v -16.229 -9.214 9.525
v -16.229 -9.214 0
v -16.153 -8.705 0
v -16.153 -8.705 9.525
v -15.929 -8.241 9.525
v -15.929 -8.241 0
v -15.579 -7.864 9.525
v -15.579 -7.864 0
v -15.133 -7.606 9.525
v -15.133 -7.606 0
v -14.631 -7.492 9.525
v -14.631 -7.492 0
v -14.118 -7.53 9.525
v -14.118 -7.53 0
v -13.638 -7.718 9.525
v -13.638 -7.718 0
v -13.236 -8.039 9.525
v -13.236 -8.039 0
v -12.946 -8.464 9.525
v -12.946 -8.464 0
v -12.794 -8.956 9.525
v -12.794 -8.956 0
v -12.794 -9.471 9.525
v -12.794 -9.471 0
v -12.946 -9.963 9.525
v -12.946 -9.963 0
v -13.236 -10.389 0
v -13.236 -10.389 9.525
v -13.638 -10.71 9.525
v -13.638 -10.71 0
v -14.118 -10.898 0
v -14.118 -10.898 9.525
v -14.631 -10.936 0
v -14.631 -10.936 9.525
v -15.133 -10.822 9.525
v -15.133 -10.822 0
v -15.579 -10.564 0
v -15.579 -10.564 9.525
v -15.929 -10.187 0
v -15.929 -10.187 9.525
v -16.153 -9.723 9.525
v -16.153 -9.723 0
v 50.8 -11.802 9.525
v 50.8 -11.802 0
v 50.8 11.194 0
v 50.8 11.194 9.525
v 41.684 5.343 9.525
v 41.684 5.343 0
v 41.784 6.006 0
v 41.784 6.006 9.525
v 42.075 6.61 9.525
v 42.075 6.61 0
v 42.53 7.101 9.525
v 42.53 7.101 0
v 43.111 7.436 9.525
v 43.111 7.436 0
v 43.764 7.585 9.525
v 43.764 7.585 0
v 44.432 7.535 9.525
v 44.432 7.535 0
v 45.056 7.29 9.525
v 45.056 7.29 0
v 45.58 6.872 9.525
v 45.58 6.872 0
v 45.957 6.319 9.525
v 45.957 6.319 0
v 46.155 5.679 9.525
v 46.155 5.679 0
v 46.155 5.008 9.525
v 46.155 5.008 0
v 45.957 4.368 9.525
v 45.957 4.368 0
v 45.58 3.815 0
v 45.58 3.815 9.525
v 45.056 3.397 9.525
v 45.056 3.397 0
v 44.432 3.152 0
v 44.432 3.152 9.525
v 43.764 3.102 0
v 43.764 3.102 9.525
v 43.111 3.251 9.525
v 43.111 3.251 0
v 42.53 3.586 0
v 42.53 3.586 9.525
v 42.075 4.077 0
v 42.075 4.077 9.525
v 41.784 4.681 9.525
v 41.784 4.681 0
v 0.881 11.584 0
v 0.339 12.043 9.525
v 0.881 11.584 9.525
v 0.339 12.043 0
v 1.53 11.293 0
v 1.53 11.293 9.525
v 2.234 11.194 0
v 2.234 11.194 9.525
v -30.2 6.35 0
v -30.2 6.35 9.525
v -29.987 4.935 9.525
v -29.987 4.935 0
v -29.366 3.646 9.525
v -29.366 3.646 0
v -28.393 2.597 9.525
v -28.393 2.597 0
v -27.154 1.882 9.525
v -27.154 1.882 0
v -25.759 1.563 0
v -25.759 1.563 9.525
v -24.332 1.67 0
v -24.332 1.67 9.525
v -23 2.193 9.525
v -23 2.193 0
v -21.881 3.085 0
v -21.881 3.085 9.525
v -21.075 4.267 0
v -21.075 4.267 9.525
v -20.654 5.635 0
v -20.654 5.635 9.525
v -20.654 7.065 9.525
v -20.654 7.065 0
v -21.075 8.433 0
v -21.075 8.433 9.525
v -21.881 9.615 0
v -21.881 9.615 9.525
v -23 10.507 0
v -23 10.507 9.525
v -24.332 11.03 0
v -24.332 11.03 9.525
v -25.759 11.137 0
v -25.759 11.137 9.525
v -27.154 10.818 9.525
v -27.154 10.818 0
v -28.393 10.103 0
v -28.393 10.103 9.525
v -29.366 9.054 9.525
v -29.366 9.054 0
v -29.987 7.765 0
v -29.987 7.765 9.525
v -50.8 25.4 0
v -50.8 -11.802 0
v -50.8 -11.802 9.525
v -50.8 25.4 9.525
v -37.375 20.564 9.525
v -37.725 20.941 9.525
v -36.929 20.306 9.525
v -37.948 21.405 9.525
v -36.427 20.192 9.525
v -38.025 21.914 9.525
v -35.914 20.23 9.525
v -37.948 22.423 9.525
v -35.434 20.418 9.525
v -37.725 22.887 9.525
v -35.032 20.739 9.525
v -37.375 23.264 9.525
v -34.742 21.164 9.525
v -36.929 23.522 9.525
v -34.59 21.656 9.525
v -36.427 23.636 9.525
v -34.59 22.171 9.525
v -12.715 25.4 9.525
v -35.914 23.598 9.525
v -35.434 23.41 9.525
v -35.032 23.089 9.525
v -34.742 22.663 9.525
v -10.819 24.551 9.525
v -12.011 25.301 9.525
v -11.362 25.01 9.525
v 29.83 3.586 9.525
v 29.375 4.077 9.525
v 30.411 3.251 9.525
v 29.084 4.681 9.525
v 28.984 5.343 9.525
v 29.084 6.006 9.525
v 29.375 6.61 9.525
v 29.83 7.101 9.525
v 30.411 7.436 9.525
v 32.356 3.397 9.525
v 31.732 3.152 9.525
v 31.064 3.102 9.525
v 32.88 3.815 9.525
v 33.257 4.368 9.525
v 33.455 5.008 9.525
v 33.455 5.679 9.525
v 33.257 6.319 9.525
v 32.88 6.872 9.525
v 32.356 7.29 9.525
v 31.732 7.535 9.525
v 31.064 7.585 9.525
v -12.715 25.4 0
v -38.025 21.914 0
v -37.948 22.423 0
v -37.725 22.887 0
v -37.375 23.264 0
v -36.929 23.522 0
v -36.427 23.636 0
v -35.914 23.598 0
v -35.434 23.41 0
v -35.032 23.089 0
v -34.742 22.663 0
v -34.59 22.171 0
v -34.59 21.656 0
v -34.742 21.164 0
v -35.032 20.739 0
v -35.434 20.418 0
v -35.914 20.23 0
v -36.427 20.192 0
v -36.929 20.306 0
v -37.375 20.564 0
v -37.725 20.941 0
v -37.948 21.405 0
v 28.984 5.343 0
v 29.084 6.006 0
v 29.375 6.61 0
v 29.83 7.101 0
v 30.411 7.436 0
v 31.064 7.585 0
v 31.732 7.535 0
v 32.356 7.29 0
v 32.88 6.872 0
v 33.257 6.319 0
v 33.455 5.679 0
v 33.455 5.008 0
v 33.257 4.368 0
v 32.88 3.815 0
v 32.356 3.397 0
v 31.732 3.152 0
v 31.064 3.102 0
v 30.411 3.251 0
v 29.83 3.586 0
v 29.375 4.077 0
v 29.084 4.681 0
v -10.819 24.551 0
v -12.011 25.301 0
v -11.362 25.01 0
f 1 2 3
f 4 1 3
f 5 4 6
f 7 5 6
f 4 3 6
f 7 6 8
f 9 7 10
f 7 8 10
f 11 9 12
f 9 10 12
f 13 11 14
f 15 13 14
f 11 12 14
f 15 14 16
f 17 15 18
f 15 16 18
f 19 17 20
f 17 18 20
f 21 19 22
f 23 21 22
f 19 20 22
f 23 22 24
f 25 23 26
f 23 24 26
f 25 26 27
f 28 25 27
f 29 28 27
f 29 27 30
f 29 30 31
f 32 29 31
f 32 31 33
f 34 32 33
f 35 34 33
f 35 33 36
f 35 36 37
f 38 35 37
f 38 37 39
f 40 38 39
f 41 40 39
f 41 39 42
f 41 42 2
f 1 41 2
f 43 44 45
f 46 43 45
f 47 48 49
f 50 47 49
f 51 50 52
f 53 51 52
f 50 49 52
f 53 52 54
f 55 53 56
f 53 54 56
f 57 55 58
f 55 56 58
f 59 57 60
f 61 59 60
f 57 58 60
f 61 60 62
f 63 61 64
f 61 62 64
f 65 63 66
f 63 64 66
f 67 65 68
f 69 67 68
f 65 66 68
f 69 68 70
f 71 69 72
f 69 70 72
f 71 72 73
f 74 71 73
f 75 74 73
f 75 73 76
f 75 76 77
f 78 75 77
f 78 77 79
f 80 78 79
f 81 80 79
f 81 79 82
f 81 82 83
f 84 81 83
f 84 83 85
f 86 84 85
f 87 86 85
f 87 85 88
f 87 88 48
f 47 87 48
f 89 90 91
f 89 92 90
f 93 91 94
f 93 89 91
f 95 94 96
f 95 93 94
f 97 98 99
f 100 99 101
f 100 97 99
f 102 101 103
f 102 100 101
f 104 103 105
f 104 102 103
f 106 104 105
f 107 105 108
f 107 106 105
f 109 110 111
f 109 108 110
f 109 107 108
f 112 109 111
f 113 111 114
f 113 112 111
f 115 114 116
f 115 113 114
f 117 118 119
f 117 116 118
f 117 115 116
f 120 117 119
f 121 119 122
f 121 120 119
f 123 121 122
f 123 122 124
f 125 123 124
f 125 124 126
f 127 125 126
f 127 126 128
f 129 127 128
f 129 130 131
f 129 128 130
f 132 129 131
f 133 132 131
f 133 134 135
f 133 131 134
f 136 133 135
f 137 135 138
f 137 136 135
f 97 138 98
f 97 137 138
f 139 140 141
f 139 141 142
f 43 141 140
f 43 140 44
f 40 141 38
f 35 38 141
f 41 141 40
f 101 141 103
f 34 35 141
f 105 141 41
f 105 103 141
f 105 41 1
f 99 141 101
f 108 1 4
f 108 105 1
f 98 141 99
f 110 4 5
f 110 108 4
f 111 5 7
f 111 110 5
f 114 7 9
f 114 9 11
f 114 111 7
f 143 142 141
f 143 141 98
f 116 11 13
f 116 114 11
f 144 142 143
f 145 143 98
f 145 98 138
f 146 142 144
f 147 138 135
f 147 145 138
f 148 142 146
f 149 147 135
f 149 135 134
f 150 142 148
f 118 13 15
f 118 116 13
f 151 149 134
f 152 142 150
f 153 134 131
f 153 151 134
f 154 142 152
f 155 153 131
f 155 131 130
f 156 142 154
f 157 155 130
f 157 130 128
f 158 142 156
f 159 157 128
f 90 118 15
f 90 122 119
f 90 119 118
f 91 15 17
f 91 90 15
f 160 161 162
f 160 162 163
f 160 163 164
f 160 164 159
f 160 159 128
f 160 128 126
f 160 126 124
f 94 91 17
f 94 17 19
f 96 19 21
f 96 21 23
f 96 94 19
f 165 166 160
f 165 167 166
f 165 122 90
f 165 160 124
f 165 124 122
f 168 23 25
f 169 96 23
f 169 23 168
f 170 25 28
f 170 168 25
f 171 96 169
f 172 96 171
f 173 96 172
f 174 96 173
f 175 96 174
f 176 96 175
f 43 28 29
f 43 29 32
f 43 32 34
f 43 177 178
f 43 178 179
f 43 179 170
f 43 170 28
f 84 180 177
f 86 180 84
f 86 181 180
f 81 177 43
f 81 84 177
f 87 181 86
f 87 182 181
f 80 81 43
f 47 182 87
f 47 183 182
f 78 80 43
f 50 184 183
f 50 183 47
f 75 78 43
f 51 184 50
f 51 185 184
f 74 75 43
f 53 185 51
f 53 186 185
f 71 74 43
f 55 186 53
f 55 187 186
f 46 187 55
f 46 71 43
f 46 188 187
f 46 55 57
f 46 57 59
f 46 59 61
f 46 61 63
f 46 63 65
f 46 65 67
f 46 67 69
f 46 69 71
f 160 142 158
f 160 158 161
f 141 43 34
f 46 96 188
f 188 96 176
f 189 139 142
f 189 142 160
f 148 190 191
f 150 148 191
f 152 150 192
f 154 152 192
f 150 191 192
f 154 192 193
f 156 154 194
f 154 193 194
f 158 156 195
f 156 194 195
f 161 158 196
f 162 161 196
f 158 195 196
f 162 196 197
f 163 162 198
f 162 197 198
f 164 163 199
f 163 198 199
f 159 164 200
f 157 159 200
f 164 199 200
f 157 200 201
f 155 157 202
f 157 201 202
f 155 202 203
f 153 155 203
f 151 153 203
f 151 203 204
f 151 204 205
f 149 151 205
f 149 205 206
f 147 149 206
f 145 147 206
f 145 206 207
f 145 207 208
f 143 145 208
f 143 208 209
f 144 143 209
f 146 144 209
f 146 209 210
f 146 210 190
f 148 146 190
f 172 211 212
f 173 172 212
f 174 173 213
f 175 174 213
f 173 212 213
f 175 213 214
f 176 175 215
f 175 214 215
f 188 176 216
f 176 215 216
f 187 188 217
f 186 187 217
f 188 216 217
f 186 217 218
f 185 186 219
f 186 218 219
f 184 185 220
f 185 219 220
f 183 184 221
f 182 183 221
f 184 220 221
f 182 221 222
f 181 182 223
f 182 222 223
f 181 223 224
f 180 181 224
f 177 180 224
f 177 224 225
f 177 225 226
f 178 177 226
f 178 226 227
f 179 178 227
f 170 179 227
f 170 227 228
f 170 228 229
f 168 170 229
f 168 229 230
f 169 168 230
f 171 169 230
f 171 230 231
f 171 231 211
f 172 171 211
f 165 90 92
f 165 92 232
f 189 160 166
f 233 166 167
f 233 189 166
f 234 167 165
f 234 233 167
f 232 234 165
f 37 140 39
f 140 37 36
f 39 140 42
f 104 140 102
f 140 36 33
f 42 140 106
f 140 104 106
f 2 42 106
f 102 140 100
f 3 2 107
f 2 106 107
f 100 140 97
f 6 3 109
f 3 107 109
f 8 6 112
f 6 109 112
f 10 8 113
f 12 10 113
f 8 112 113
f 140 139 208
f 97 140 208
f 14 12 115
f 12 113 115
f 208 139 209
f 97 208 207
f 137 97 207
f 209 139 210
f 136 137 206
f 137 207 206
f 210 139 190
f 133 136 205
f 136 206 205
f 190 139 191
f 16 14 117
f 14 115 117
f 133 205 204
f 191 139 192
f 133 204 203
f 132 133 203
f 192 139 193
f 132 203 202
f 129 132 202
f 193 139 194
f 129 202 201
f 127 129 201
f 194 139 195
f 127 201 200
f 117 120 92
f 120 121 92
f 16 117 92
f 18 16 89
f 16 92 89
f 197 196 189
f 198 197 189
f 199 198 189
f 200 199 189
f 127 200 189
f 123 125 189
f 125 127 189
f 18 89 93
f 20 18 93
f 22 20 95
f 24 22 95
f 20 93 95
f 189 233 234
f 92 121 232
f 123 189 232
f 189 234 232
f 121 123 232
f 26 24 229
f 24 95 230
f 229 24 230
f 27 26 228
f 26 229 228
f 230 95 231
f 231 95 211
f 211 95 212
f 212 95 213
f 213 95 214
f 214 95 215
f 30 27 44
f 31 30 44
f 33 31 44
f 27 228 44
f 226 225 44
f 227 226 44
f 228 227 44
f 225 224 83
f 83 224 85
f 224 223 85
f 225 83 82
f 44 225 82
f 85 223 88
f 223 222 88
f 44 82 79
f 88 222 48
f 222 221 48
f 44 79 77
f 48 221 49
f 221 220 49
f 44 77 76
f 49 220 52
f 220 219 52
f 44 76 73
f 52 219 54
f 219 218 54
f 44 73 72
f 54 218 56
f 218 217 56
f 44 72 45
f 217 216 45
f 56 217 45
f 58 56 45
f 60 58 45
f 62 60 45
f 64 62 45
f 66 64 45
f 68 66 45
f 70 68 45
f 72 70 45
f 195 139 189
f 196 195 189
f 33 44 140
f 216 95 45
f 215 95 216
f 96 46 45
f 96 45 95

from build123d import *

# Parameters (mm, degrees)
SKETCH1_W                 = 101.6
SKETCH1_H                 = 50.8
BOSS_EXTRUDE1_DEPTH       = 9.525
SKETCH6_R                 = 4.8
CUT_EXTRUDE1_DEPTH        = 58.589283942
TAP_DRILL_FOR_8_32_TAP1_D = 3.4544
F_8_CLEARANCE_HOLE1_D     = 4.4958
SKETCH10_W                = 101.6
SKETCH10_H                = 37.138907791
CUT_EXTRUDE2_DEPTH        = 58.589283942
CUT_EXTRUDE3_DEPTH        = 58.589283942
FILLET1_R                 = 2.54


with BuildPart() as part:
    # Sketch1 → Boss-Extrude1 (new body)
    with BuildSketch(Plane.XY):
        Rectangle(SKETCH1_W, SKETCH1_H)
    extrude(amount=BOSS_EXTRUDE1_DEPTH)

    # Sketch6 → Cut-Extrude1 (cut, through all)
    with BuildSketch(Plane.XY):
        with Locations(Location((-25.4, 6.35, 0), (0, 0, 180))):
            Circle(SKETCH6_R)
    extrude(amount=CUT_EXTRUDE1_DEPTH, mode=Mode.SUBTRACT)

    # Tap Drill for #8-32 Tap1 (through all)
    with Locations(Plane.XY.offset(9.525)):
        with Locations((-14.502047709, -9.213888841), (-36.297952291, 21.913888841)):
            Hole(TAP_DRILL_FOR_8_32_TAP1_D / 2)

    # #8 Clearance Hole1 (through all)
    with Locations(Plane.XY.offset(9.525)):
        with Locations((31.231814057, 5.34348178), (43.931814057, 5.34348178)):
            Hole(F_8_CLEARANCE_HOLE1_D / 2)

    # Sketch10 → Cut-Extrude2 (cut, through all)
    with BuildSketch(Plane.XY.offset(9.525)):
        with Locations((0, -30.370972115)):
            Rectangle(SKETCH10_W, SKETCH10_H)
    extrude(amount=-CUT_EXTRUDE2_DEPTH, mode=Mode.SUBTRACT)

    # Sketch11 → Cut-Extrude3 (cut, through all)
    with BuildSketch(Plane.XY.offset(9.525)):
        Polygon((50.8, 11.193885079), (1.096095255, 11.193885079), (-11.576646979, 25.4), (50.8, 25.4), align=None)
    extrude(amount=-CUT_EXTRUDE3_DEPTH, mode=Mode.SUBTRACT)

    # Fillet1
    fillet1_edges = [part.edges().sort_by_distance(p)[0] for p in [
        (1.096095255, 11.193885079, 4.7625),
        (-11.576646979, 25.4, 4.7625),
    ]]
    fillet(fillet1_edges, radius=FILLET1_R)


solid = part.part
